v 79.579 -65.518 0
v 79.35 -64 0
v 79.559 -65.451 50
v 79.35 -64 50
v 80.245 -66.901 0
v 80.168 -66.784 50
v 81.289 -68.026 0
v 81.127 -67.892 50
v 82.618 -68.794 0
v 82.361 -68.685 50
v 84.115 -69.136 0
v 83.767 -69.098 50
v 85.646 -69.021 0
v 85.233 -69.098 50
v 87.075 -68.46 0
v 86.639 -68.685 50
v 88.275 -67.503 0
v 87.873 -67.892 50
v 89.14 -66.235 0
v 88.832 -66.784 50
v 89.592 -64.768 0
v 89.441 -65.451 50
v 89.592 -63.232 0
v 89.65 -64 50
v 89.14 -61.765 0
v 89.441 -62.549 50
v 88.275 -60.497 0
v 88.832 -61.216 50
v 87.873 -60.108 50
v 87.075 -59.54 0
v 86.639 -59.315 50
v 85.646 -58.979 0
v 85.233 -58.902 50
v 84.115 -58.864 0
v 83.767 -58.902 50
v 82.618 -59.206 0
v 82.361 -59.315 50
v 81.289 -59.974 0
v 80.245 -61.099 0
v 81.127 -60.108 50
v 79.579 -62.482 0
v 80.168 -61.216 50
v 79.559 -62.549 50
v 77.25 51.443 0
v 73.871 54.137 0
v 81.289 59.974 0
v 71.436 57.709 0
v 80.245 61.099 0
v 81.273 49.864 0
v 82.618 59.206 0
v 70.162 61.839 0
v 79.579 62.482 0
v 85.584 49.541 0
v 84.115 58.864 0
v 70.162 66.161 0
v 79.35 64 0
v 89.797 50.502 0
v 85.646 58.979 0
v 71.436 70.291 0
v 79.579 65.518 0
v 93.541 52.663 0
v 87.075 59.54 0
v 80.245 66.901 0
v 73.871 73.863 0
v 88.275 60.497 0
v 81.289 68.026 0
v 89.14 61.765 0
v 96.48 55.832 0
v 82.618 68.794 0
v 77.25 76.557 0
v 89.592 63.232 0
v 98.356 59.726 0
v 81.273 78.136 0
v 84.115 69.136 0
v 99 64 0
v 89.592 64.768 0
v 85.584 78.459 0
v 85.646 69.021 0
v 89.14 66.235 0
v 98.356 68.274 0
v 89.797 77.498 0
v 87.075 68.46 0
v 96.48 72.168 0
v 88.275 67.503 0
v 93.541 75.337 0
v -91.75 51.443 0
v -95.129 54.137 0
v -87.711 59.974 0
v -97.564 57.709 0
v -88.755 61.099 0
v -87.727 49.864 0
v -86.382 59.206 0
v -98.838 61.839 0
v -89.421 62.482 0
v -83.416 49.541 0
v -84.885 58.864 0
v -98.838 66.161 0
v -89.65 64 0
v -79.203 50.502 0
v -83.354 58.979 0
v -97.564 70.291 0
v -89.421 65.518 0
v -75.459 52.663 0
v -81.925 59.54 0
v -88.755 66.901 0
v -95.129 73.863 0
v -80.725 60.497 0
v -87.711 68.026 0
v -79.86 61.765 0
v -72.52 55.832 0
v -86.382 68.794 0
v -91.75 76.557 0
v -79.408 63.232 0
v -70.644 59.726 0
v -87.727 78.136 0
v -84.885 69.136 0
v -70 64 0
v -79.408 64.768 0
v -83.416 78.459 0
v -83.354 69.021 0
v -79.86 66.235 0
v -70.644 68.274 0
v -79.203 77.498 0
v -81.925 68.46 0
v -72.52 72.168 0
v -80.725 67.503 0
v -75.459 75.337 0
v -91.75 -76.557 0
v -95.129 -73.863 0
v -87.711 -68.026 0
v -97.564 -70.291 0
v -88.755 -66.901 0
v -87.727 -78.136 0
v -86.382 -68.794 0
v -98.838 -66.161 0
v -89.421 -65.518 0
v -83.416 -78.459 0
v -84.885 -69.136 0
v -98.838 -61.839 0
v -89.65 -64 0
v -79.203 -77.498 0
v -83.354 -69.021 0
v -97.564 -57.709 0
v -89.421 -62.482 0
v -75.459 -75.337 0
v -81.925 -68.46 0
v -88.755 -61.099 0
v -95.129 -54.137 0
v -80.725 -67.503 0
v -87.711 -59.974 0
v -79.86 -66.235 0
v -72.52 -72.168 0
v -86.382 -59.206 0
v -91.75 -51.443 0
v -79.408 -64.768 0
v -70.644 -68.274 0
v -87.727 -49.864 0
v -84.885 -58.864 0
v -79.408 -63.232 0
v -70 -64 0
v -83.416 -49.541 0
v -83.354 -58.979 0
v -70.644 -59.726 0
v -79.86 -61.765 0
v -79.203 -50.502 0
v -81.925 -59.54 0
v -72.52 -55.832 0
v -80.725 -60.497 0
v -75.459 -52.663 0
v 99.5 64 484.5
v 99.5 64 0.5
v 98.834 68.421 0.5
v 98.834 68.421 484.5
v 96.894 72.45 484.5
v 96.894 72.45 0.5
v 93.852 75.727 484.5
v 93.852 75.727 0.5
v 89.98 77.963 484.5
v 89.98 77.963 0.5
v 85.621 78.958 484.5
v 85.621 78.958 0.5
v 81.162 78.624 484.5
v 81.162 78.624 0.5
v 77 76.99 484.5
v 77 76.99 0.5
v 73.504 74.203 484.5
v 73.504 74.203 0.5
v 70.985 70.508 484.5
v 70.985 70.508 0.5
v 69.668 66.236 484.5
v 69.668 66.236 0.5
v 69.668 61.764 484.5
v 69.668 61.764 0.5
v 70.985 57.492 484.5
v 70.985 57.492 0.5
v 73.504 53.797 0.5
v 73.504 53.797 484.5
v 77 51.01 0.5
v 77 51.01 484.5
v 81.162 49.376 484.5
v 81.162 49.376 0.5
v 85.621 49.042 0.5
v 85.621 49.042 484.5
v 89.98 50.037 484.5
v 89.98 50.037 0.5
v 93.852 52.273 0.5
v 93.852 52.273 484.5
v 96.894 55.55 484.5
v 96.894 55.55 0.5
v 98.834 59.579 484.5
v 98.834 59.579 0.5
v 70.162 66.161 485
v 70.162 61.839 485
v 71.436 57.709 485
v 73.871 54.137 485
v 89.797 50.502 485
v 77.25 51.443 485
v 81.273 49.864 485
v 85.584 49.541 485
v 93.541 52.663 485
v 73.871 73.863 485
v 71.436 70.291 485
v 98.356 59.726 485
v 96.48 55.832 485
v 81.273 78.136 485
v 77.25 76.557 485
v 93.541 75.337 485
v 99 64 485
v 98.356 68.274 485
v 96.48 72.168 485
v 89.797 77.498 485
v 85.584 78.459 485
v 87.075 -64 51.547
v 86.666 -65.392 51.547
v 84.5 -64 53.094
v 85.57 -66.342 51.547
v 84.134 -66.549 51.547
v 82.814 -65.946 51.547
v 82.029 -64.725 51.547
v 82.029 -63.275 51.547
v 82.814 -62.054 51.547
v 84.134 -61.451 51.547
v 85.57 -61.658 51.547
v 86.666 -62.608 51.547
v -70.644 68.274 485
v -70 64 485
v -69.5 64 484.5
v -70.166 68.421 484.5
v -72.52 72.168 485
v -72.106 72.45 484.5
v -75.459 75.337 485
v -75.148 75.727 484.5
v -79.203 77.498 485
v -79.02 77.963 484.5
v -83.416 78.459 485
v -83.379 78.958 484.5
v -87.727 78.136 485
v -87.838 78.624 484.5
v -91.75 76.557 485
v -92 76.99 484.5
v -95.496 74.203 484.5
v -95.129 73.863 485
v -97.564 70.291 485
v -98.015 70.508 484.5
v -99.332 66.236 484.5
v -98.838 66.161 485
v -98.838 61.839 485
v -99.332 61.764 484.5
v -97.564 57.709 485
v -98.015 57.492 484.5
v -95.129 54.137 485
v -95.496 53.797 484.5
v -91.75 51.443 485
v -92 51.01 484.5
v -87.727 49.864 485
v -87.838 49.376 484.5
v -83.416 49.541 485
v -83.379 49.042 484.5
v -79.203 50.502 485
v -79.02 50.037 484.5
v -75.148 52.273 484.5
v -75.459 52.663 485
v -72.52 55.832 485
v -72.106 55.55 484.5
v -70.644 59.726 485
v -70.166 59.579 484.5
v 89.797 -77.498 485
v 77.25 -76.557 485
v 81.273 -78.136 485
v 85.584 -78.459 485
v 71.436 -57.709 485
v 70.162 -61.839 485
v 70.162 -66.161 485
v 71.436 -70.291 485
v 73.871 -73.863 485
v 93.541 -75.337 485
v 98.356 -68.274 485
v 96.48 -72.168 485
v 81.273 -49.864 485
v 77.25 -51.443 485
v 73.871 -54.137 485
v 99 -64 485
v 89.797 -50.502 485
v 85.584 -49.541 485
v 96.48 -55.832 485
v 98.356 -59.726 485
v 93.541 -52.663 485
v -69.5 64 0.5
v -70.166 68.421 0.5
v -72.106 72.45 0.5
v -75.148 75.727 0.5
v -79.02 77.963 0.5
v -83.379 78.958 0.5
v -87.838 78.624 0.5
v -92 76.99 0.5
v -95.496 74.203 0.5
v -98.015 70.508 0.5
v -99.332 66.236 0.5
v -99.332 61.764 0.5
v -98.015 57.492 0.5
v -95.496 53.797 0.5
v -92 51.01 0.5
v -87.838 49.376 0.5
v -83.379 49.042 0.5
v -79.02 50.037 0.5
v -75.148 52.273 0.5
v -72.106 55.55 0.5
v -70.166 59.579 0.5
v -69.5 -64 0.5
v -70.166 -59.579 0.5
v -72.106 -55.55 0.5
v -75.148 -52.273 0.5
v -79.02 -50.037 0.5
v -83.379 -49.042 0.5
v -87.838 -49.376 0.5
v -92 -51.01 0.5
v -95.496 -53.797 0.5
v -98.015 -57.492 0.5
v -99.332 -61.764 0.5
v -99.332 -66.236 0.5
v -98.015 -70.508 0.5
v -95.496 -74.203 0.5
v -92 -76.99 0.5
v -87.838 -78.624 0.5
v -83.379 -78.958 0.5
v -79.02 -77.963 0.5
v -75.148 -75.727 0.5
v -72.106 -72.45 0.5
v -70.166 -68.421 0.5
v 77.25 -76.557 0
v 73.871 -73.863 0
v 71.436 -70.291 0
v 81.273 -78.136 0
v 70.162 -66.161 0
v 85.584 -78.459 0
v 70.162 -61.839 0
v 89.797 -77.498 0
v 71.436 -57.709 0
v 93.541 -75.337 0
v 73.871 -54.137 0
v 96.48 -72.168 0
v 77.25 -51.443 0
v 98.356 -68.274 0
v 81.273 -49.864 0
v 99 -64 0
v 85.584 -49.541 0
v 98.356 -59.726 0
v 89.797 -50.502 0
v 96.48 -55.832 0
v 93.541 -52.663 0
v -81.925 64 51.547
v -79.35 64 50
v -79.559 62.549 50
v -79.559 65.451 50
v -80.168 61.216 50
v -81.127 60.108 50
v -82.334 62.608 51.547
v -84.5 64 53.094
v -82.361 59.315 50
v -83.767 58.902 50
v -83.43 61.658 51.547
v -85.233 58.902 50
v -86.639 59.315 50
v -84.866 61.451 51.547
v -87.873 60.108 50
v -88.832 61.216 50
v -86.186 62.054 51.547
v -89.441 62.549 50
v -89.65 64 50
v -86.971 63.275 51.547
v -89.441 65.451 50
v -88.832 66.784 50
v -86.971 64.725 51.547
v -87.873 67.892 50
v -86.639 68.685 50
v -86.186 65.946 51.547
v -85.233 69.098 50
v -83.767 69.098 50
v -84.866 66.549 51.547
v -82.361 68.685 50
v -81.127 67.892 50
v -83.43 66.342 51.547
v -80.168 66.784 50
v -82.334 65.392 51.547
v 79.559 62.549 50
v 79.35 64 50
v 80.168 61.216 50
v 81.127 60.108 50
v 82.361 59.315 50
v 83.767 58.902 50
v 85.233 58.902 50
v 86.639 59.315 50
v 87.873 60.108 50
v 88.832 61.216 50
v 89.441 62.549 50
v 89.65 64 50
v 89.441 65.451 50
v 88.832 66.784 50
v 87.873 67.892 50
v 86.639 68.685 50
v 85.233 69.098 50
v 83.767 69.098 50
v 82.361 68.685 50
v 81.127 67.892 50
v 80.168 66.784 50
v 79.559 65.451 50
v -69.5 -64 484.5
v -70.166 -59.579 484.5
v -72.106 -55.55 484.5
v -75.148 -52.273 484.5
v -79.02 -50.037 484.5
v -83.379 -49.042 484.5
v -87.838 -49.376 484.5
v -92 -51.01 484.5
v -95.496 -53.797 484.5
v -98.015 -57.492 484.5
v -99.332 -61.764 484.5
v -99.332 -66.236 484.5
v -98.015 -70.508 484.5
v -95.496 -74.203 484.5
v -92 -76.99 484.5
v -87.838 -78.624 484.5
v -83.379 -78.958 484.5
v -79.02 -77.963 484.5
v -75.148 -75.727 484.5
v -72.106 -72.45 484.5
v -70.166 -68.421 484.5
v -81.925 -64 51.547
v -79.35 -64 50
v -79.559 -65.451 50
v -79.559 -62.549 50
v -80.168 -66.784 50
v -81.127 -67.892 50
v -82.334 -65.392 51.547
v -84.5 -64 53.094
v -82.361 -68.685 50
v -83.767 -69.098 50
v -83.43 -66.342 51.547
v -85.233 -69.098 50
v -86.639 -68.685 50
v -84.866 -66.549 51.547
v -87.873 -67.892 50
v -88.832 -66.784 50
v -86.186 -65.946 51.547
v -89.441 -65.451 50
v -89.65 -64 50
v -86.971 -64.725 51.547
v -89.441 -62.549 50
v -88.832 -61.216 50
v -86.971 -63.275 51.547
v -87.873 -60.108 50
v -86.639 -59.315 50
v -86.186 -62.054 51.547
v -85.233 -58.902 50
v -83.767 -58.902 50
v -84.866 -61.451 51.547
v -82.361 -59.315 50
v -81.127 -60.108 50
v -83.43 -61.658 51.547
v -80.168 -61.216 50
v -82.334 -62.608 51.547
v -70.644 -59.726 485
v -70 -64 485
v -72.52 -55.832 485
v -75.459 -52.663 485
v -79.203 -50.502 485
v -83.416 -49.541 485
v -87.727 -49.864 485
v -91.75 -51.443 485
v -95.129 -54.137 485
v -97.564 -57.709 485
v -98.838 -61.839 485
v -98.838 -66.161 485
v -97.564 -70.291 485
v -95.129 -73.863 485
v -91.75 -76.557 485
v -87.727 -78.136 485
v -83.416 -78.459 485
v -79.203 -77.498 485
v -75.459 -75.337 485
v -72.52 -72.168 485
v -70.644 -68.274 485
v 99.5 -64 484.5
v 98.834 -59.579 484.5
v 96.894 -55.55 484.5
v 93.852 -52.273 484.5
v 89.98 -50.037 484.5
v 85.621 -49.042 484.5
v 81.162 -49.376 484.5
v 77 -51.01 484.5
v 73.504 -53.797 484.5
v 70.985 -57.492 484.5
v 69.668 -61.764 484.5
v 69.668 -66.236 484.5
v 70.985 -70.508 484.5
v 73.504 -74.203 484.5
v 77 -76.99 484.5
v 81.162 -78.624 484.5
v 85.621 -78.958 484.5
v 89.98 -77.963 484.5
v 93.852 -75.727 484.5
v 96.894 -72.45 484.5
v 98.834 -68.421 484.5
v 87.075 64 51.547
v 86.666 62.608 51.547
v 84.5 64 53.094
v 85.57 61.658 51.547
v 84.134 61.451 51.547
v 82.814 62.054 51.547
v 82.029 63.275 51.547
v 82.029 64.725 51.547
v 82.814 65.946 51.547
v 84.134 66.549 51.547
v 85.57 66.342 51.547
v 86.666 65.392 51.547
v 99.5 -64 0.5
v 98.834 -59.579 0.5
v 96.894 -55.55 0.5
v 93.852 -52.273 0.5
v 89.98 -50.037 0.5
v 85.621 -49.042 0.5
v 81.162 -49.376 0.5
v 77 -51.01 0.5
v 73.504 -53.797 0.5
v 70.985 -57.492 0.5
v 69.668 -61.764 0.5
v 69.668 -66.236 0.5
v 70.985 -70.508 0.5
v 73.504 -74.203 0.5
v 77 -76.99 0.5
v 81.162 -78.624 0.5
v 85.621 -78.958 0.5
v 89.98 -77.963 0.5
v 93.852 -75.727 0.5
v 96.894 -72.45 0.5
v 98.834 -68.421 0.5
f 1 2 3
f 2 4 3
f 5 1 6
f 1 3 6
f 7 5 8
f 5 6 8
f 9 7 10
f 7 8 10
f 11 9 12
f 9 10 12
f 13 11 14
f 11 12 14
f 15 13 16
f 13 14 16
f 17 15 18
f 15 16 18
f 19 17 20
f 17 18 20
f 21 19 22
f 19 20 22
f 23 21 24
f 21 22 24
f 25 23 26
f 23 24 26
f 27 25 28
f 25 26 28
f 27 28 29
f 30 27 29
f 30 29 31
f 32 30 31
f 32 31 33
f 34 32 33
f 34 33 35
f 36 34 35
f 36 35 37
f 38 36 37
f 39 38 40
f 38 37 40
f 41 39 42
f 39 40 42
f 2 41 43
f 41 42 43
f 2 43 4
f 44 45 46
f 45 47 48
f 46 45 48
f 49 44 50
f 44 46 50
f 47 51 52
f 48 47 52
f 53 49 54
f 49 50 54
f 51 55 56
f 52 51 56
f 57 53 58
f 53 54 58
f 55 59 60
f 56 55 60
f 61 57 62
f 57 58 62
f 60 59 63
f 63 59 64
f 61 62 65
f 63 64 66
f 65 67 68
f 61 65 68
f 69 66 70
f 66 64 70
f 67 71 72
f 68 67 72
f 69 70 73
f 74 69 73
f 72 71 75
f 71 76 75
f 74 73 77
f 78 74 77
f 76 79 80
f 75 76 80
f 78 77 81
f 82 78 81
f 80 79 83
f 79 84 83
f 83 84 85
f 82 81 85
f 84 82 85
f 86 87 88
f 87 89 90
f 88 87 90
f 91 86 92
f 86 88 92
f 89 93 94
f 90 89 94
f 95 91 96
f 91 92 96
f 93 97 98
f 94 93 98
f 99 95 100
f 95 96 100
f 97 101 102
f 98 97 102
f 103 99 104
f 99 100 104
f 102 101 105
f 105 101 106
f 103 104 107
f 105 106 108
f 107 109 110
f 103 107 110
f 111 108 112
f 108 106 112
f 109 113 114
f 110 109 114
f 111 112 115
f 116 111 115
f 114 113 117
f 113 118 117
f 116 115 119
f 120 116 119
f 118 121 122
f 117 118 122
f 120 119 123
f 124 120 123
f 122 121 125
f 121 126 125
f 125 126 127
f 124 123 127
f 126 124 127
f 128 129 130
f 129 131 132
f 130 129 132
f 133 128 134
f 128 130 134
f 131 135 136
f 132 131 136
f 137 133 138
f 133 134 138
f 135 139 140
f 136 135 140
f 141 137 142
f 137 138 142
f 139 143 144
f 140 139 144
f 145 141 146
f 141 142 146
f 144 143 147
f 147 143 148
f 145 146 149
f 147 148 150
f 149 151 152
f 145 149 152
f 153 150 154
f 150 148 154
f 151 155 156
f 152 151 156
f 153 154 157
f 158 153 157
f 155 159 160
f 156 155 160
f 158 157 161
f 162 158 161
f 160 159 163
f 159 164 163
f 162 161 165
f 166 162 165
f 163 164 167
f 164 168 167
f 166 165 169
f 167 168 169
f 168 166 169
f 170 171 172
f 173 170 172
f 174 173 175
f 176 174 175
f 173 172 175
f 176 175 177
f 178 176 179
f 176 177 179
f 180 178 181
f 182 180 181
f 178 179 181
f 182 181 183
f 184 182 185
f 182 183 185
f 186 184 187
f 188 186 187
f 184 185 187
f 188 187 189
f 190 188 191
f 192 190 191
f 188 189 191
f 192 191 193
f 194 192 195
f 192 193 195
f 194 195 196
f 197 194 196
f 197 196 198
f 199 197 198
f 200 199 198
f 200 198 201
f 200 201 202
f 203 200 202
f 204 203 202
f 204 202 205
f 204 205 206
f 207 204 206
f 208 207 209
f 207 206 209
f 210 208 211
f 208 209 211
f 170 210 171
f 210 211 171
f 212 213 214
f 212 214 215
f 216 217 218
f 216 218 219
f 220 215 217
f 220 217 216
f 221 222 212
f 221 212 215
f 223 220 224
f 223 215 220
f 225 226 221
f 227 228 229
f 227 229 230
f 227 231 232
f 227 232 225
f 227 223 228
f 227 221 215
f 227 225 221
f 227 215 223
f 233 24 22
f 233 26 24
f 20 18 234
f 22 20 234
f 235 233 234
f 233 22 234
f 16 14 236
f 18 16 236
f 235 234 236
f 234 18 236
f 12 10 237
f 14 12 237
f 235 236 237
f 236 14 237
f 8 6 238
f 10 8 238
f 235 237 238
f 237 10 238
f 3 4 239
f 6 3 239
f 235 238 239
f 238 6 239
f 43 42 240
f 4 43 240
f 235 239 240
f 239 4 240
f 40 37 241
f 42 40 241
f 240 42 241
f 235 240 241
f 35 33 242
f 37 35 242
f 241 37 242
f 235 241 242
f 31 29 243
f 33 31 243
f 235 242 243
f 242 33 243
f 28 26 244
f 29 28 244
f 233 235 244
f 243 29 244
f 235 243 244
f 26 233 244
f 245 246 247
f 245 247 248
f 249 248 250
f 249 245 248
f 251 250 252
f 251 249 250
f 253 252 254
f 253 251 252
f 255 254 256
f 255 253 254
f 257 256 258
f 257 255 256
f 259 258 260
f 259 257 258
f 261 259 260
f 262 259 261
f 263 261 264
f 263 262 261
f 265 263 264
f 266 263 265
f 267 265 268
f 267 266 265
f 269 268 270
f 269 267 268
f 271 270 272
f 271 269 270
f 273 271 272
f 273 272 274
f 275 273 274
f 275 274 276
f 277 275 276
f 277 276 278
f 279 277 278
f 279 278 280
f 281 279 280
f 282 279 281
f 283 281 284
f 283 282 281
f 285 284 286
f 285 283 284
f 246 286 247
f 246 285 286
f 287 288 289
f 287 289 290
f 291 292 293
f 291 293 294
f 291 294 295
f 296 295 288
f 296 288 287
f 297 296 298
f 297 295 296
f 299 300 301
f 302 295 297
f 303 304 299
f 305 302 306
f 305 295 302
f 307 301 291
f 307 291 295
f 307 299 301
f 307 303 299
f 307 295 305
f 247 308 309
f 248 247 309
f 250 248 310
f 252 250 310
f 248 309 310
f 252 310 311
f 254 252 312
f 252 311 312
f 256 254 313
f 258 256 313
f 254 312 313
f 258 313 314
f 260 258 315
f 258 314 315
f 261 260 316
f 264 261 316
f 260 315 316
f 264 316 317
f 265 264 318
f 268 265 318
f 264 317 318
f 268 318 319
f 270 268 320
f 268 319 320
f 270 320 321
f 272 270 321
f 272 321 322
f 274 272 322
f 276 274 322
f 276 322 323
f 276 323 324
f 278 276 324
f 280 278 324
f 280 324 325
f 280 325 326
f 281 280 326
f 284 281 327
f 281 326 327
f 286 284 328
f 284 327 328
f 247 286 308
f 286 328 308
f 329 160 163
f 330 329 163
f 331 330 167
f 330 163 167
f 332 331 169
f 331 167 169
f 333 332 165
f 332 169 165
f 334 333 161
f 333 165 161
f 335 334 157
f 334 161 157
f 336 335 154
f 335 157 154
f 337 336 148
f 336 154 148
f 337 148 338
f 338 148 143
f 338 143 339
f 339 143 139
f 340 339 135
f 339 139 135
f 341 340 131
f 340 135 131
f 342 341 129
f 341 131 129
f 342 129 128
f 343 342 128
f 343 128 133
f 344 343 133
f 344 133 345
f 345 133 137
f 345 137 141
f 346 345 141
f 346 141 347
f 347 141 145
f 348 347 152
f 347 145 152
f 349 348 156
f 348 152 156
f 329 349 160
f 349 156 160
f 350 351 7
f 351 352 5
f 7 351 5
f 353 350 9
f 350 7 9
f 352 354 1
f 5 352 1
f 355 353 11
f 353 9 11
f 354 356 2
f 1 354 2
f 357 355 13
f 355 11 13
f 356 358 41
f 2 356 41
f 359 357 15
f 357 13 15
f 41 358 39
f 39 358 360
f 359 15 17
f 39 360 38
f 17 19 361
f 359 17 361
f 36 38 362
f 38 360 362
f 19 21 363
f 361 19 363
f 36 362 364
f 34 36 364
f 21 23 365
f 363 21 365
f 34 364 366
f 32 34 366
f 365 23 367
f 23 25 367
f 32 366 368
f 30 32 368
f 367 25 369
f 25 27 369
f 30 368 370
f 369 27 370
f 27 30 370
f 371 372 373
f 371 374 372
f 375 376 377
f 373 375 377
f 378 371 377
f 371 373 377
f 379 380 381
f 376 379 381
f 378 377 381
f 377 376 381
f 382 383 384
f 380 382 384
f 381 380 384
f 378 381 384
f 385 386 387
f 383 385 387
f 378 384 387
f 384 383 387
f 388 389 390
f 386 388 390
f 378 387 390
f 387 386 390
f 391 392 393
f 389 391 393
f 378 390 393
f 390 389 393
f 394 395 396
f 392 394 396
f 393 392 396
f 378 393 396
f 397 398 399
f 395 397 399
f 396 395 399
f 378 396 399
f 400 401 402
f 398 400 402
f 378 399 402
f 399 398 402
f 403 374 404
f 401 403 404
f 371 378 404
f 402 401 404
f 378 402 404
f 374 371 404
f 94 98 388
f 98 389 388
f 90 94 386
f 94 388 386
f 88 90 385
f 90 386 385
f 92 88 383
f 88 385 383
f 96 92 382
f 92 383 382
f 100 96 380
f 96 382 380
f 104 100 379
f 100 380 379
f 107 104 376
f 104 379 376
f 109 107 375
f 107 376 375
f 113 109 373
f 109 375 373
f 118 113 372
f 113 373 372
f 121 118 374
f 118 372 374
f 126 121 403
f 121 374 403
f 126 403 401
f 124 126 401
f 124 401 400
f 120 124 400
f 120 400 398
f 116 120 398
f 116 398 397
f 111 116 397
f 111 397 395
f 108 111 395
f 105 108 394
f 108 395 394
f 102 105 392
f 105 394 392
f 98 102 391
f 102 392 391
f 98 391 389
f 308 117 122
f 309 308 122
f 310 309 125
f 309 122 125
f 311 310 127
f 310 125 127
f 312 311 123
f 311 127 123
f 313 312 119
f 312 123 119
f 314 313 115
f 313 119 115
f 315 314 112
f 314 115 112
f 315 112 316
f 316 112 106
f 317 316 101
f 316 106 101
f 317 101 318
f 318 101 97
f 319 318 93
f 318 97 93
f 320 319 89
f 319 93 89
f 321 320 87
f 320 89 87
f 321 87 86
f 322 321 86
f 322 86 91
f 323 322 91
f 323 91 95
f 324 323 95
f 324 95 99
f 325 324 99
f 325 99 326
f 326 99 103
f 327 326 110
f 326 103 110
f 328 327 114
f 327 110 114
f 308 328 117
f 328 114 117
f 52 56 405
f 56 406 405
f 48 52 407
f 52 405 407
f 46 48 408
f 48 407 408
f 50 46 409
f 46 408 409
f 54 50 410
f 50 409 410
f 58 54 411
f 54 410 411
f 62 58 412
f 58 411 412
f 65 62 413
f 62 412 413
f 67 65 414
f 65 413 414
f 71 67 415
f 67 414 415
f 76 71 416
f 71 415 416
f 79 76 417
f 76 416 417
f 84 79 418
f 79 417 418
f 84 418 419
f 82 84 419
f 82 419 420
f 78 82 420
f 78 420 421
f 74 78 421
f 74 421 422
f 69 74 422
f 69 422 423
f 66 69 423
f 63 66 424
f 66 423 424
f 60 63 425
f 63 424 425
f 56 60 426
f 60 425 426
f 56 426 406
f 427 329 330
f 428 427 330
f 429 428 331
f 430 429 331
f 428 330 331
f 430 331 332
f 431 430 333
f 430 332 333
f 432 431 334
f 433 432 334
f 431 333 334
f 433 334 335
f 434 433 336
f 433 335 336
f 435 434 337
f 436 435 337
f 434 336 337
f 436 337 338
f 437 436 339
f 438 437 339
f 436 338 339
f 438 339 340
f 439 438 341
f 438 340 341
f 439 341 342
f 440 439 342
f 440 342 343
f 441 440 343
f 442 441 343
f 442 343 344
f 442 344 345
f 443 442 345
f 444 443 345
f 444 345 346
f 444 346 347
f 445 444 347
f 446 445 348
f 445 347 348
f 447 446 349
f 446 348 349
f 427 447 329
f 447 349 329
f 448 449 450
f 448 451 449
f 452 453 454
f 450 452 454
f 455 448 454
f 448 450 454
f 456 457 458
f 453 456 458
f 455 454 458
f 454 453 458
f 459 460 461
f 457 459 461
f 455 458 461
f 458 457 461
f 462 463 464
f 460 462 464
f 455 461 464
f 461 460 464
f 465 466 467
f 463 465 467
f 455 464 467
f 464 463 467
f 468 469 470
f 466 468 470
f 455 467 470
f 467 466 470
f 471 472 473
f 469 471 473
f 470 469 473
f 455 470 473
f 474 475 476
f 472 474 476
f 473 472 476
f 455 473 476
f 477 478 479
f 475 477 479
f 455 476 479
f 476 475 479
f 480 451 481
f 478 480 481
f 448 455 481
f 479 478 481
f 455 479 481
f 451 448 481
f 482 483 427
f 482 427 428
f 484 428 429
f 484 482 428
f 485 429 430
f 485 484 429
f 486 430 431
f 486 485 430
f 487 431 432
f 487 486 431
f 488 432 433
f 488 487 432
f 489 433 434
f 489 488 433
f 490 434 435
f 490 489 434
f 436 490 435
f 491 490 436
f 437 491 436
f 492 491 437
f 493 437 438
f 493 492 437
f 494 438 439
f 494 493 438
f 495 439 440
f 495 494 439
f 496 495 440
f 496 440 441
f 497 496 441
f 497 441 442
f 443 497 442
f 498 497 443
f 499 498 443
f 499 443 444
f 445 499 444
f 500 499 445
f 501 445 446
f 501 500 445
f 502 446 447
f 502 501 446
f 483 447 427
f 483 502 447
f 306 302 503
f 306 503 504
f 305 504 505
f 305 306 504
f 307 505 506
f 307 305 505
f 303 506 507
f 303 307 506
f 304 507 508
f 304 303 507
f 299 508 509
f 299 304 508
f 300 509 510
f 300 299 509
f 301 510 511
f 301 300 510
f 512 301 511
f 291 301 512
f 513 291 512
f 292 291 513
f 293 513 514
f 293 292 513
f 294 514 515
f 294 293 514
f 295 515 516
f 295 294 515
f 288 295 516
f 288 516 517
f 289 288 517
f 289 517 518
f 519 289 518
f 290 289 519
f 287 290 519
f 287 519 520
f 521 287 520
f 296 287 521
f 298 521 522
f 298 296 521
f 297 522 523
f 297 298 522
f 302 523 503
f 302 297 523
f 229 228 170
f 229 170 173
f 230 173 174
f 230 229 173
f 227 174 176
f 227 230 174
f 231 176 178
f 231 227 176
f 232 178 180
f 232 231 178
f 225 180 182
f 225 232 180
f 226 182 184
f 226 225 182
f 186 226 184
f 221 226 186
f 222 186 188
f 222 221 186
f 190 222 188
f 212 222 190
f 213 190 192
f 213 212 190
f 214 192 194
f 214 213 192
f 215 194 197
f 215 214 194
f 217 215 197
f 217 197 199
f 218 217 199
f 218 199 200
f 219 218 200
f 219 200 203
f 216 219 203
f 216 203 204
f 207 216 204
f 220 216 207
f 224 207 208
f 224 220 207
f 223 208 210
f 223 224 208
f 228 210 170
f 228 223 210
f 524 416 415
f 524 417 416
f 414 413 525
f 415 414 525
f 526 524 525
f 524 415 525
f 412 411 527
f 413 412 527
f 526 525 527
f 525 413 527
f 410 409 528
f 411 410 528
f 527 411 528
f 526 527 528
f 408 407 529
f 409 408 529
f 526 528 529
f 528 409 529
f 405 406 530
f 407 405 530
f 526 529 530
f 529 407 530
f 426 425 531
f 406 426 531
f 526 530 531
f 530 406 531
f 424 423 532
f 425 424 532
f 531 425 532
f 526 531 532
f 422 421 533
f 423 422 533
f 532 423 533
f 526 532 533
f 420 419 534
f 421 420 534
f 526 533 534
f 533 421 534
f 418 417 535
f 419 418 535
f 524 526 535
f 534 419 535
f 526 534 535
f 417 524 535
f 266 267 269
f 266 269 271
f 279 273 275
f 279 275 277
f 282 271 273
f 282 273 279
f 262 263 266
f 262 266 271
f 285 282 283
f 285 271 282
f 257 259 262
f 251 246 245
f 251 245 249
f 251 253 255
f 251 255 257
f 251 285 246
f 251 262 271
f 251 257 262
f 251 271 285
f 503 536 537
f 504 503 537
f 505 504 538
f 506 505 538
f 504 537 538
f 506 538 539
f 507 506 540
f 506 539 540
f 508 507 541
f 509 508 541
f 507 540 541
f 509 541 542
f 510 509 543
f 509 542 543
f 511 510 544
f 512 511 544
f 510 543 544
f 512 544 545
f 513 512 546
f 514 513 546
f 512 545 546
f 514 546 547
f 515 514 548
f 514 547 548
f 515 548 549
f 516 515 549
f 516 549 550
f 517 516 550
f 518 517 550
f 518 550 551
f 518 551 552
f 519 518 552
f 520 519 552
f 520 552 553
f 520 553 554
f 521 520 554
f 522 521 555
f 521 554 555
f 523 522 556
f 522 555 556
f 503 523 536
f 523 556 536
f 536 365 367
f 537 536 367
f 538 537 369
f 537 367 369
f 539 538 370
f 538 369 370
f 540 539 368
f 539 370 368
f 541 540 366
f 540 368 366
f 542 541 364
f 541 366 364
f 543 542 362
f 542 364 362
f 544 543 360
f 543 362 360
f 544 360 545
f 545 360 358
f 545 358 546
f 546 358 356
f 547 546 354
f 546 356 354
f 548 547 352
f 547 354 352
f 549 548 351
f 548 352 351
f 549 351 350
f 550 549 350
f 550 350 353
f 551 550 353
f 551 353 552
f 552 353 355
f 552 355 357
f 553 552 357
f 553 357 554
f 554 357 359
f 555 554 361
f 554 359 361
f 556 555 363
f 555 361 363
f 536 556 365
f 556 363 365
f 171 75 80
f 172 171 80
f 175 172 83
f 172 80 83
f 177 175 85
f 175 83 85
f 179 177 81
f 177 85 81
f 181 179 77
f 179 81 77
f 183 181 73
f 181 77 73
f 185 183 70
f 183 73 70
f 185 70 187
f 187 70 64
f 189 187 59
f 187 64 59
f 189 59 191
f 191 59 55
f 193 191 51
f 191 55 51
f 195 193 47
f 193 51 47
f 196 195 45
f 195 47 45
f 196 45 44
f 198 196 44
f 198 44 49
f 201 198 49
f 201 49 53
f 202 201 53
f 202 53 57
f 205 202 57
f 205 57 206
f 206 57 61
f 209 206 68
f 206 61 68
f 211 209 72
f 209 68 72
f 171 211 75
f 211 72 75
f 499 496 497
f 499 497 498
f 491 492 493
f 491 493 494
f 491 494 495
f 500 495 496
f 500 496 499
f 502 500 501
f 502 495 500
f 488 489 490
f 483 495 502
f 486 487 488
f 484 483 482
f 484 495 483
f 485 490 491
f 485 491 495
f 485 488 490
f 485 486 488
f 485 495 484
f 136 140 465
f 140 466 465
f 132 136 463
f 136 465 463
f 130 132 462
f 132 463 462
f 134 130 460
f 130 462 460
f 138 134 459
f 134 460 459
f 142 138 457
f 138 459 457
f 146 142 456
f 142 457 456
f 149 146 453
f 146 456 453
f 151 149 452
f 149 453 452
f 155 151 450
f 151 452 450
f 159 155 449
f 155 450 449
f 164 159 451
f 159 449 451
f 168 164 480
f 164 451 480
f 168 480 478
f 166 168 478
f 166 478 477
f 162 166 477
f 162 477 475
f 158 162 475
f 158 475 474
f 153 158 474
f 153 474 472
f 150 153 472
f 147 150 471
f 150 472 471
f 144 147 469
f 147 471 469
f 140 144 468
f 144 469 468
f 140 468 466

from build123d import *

# Parameters (mm, degrees)
F0_R       = 15
F1_DEPTH   = 485
F2_D       = 10.3
F2_DEPTH   = 50
F2_TIP     = 3.094432188
F2_2_D     = 10.3
F2_2_DEPTH = 50
F2_2_TIP   = 3.094432188
F2_3_D     = 10.3
F2_3_DEPTH = 50
F2_3_TIP   = 3.094432188
F2_4_D     = 10.3
F2_4_DEPTH = 50
F2_4_TIP   = 3.094432188
F3_SIZE    = 0.5
F3_2_SIZE  = 0.5
F3_3_SIZE  = 0.5
F3_4_SIZE  = 0.5


with BuildPart() as f1:
    # F0 (on Top) → F1 (new body)
    with BuildSketch(Plane.XY):
        with Locations((84.5, -64)):
            Circle(F0_R)
    extrude(amount=F1_DEPTH)

    # F2
    with Locations(Plane(origin=(0, 0, 0), x_dir=(1, 0, 0), z_dir=(0, 0, -1))):
        with Locations((-84.5, -64), (-84.5, 64), (84.5, 64), (84.5, -64)):
            Hole(F2_D / 2, depth=F2_DEPTH)
            with Locations((0, 0, -(F2_DEPTH + F2_TIP / 2))):  # 118° drill point
                Cone(0, F2_D / 2, F2_TIP, mode=Mode.SUBTRACT)

    # F3
    f3_edges = [f1.edges().sort_by_distance(p)[0] for p in [
        (99.5, -64, 242.5),
        (69.5, -64, 0),
        (69.5, -64, 485),
    ]]
    chamfer(f3_edges, length=F3_SIZE)


with BuildPart() as f1b:
    # F0 (on Top) → F1, piece 2 (new body)
    with BuildSketch(Plane.XY):
        with Locations((-84.5, -64)):
            Circle(F0_R)
    extrude(amount=F1_DEPTH)

    # F2#2
    with Locations(Plane(origin=(0, 0, 0), x_dir=(1, 0, 0), z_dir=(0, 0, -1))):
        with Locations((-84.5, -64), (-84.5, 64), (84.5, 64), (84.5, -64)):
            Hole(F2_2_D / 2, depth=F2_2_DEPTH)
            with Locations((0, 0, -(F2_2_DEPTH + F2_2_TIP / 2))):  # 118° drill point
                Cone(0, F2_2_D / 2, F2_2_TIP, mode=Mode.SUBTRACT)

    # F3#2
    f3_2_edges = [f1b.edges().sort_by_distance(p)[0] for p in [
        (-69.5, -64, 242.5),
        (-99.5, -64, 0),
        (-99.5, -64, 485),
    ]]
    chamfer(f3_2_edges, length=F3_2_SIZE)


with BuildPart() as f1c:
    # F0 (on Top) → F1, piece 3 (new body)
    with BuildSketch(Plane.XY):
        with Locations((-84.5, 64)):
            Circle(F0_R)
    extrude(amount=F1_DEPTH)

    # F2#3
    with Locations(Plane(origin=(0, 0, 0), x_dir=(1, 0, 0), z_dir=(0, 0, -1))):
        with Locations((-84.5, -64), (-84.5, 64), (84.5, 64), (84.5, -64)):
            Hole(F2_3_D / 2, depth=F2_3_DEPTH)
            with Locations((0, 0, -(F2_3_DEPTH + F2_3_TIP / 2))):  # 118° drill point
                Cone(0, F2_3_D / 2, F2_3_TIP, mode=Mode.SUBTRACT)

    # F3#4
    f3_4_edges = [f1c.edges().sort_by_distance(p)[0] for p in [
        (-69.5, 64, 242.5),
        (-99.5, 64, 0),
        (-99.5, 64, 485),
    ]]
    chamfer(f3_4_edges, length=F3_4_SIZE)


with BuildPart() as f1d:
    # F0 (on Top) → F1, piece 4 (new body)
    with BuildSketch(Plane.XY):
        with Locations((84.5, 64)):
            Circle(F0_R)
    extrude(amount=F1_DEPTH)

    # F2#4
    with Locations(Plane(origin=(0, 0, 0), x_dir=(1, 0, 0), z_dir=(0, 0, -1))):
        with Locations((-84.5, -64), (-84.5, 64), (84.5, 64), (84.5, -64)):
            Hole(F2_4_D / 2, depth=F2_4_DEPTH)
            with Locations((0, 0, -(F2_4_DEPTH + F2_4_TIP / 2))):  # 118° drill point
                Cone(0, F2_4_D / 2, F2_4_TIP, mode=Mode.SUBTRACT)

    # F3#3
    f3_3_edges = [f1d.edges().sort_by_distance(p)[0] for p in [
        (99.5, 64, 242.5),
        (69.5, 64, 0),
        (69.5, 64, 485),
    ]]
    chamfer(f3_3_edges, length=F3_3_SIZE)


solid = Compound([f1.part, f1b.part, f1c.part, f1d.part])
